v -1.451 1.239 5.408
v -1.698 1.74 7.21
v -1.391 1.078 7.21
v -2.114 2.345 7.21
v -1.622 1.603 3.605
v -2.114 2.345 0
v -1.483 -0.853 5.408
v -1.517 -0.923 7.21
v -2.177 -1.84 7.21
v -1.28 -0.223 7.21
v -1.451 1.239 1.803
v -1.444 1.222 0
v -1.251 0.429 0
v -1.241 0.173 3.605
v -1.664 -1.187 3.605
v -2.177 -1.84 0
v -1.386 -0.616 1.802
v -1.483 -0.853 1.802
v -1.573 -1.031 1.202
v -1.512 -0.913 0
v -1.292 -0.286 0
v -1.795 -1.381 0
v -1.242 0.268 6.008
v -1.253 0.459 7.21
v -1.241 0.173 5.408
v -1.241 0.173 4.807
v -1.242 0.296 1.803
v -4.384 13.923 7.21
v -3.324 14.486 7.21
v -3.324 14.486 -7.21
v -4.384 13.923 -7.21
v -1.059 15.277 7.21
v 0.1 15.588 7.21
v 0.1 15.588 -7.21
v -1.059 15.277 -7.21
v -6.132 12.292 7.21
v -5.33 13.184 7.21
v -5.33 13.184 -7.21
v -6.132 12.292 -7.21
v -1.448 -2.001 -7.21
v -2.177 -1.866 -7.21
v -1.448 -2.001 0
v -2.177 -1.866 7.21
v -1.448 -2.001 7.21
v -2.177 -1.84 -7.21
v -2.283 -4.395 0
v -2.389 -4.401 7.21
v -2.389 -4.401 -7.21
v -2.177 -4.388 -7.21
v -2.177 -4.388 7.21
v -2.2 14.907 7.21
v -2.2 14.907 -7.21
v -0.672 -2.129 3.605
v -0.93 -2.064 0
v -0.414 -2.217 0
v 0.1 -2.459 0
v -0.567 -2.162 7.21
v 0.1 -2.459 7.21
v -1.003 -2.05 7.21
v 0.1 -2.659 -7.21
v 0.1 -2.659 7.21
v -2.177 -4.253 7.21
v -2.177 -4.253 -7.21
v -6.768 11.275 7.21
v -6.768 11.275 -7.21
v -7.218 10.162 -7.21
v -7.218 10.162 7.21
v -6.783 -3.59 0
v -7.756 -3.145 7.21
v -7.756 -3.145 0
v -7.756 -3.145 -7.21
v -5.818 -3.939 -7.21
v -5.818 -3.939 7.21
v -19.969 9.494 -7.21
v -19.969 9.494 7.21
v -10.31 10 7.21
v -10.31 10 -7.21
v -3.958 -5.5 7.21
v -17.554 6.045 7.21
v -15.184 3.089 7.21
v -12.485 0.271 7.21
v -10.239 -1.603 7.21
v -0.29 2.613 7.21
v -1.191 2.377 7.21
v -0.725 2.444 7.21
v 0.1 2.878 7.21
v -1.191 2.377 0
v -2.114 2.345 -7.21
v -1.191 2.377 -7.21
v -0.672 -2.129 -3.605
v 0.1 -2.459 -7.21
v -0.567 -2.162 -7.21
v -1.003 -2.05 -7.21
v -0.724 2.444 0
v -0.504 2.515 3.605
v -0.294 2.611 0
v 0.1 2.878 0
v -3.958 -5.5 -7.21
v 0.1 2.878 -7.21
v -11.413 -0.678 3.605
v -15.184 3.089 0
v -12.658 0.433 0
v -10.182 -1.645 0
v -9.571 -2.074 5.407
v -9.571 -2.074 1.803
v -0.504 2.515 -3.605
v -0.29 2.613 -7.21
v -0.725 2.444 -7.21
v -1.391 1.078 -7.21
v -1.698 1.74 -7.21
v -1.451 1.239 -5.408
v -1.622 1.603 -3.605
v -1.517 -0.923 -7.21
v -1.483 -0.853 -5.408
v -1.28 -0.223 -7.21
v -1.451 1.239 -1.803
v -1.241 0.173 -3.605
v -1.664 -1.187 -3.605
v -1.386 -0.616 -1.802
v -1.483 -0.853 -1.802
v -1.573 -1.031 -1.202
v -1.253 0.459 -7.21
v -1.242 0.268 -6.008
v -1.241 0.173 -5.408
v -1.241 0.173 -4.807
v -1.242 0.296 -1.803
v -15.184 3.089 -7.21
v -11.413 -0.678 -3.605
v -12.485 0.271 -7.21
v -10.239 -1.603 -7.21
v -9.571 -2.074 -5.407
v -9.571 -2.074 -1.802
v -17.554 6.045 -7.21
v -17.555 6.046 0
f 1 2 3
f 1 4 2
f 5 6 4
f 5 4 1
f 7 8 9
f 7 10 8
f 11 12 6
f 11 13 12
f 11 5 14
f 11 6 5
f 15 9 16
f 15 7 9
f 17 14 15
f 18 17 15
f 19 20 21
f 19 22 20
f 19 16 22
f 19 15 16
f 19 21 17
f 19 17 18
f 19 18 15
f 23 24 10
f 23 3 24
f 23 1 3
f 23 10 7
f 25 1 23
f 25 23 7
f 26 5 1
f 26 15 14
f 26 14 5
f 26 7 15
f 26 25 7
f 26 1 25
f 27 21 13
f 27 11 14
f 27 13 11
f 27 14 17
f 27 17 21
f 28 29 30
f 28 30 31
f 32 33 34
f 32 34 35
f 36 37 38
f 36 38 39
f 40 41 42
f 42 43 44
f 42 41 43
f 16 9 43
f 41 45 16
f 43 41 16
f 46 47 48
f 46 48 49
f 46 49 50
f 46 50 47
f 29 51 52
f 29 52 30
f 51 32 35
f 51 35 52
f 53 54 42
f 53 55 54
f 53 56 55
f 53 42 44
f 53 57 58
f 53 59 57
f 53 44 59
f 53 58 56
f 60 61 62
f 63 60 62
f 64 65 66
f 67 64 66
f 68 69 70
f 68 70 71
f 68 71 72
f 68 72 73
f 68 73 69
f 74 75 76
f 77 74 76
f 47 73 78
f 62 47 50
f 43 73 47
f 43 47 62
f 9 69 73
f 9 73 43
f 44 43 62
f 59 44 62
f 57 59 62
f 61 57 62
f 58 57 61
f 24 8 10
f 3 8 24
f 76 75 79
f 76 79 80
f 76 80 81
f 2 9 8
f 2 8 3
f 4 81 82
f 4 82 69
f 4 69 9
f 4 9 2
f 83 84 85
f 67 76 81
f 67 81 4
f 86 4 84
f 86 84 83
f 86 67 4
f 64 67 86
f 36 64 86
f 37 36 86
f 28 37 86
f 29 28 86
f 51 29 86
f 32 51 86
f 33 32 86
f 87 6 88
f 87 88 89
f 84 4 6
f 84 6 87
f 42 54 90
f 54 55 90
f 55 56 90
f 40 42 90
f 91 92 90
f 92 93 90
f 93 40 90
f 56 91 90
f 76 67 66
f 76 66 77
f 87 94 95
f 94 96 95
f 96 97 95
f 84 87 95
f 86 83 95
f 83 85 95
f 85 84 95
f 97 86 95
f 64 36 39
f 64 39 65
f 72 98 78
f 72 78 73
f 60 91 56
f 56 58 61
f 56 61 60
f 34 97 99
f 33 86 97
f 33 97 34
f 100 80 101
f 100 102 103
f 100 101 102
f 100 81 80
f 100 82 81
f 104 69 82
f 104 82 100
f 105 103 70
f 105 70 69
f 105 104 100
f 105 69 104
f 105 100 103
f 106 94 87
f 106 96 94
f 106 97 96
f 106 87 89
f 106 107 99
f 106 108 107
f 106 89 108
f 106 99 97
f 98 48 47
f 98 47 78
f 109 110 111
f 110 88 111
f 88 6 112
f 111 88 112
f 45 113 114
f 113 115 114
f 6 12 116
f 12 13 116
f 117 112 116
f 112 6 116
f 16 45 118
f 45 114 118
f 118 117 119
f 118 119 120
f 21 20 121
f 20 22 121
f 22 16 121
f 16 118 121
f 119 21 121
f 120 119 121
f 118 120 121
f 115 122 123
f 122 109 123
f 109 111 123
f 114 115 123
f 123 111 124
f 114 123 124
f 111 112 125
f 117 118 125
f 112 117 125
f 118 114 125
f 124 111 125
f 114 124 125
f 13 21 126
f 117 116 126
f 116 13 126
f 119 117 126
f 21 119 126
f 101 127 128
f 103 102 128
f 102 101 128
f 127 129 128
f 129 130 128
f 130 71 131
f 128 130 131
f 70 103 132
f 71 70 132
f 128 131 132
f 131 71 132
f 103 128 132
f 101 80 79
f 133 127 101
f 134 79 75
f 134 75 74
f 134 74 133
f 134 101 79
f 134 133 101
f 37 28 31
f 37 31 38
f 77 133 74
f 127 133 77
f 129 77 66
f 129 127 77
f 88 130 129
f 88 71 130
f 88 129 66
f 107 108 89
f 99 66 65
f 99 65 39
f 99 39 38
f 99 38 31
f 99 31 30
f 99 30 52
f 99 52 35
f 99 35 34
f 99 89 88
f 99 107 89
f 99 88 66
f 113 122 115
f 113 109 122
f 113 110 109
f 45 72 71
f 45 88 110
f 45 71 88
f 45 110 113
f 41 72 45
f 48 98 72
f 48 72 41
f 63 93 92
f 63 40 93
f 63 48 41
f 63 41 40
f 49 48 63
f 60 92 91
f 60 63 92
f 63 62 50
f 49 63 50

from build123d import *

# Parameters (mm, degrees)
CROQUIS_BASE_DEPTH              = 7.21
LENTE_PPAL_1_REACH              = 29.232
LENTE_PPAL_1_DIRECTION_2_REACH  = 29.232
LENTE_PPAL_2_DEPTH              = 28.232395361
LENTE_PPAL_2_DEPTH_BACK         = 28.232395361
CROQUIS9_3_OUTSIDE_W            = 30.105
CROQUIS9_3_OUTSIDE_H            = 25.977
LENTE_FRONTAL_REACH             = 25.468
LENTE_FRONTAL_DIRECTION_2_REACH = 25.468
LENTE_TRASERA_REACH             = 28.339
LENTE_TRASERA_DIRECTION_2_REACH = 28.339


with BuildPart() as part:
    # Croquis1 → croquis base (new, symmetric)
    with BuildSketch(Plane.XY):
        with BuildLine():
            Line((-8.981845695, 12.608155172), (-23.035921146, 11.871612288))
            Line((-23.035921146, 11.871612288), (-23.035921146, 11.54013782))
            ThreePointArc((-23.035921146, 11.54013782), (-20.949684518, 9.582335705), (-18.945192114, 7.540918896))
            add(Edge.make_bspline(
                [(-18.945192114, 7.540918896), (-10.215008384, -3.697644103), (-2.846604825, -5.059081104)],
                knots=[0.497667241, 0.497667241, 0.497667241, 0.49955428, 0.49955428, 0.49955428], degree=2, weights=[1, 1, 1]))
            add(Edge.make_bspline(
                [(-2.846604825, -5.059081104), (-2.498165198, -4.87297933), (-2.177330418, -4.684462446)],
                knots=[0.498812075, 0.498812075, 0.498812075, 0.498911556, 0.498911556, 0.498911556], degree=2, weights=[1, 1, 1]))
            Line((-2.177330418, -4.684462446), (-2.177330418, 6.186438919))
            add(Edge.make_bspline(
                [(-2.177330418, 6.186438919), (-4.063319702, 8.141636997), (-6.994875026, 10.477389992)],
                knots=[0.50138293, 0.50138293, 0.50138293, 0.502013312, 0.502013312, 0.502013312], degree=2, weights=[1, 1, 1]))
            Line((-6.994875026, 10.477389992), (-8.981845695, 12.608155172))
        make_face()
    extrude(amount=CROQUIS_BASE_DEPTH, both=True)

    # lente ppal 1: up to this face of the body (flat: up to its plane)
    lente_ppal_1_end = Plane(part.part.faces().sort_by_distance((-10.153546236, 5.159655325, 7.21))[0])
    # Croquis9 → lente ppal 1 (add, up to the picked face)
    with BuildSketch(Plane.XY, mode=Mode.PRIVATE) as lente_ppal_1_sk1:
        with BuildLine():
            add(Edge.make_bspline(
                [(-2.177330418, -4.388282022), (-10.4130765, -4.994158739), (-19.969359014, 9.493765032)],
                knots=[0, 0, 0, 1, 1, 1], degree=2))
            Line((-19.969359014, 9.493765032), (-10.309820395, 10))
            Line((-10.309820395, 10), (-2.177330418, 6.082860828))
            Line((-2.177330418, 6.082860828), (-2.177330418, 2.424232079))
            add(Edge.make_bspline(
                [(-2.177330418, 2.424232079), (-0.304369247, 0.128042884), (-2.177330418, -1.840420572)],
                knots=[0, 0, 0, 1, 1, 1], degree=2))
            Line((-2.177330418, -1.840420572), (-2.177330418, -4.388282022))
        make_face()
    lente_ppal_1_tool1 = split(extrude(lente_ppal_1_sk1.sketch, amount=LENTE_PPAL_1_REACH, mode=Mode.PRIVATE), bisect_by=lente_ppal_1_end, keep=Keep.BOTH, mode=Mode.PRIVATE)
    add(lente_ppal_1_tool1.solids().sort_by(Axis((-9.106368, 3.599172, 0), (0, 0, 1)))[0])

    # lente ppal 1 direction 2: up to this face of the body (flat: up to its plane)
    lente_ppal_1_direction_2_end = Plane(part.part.faces().sort_by_distance((-10.153546236, 5.159655325, -7.21))[0])
    # Croquis9 → lente ppal 1 direction 2 (add, up to the picked face)
    with BuildSketch(Plane.XY, mode=Mode.PRIVATE) as lente_ppal_1_direction_2_sk1:
        with BuildLine():
            add(Edge.make_bspline(
                [(-2.177330418, -4.388282022), (-10.4130765, -4.994158739), (-19.969359014, 9.493765032)],
                knots=[0, 0, 0, 1, 1, 1], degree=2))
            Line((-19.969359014, 9.493765032), (-10.309820395, 10))
            Line((-10.309820395, 10), (-2.177330418, 6.082860828))
            Line((-2.177330418, 6.082860828), (-2.177330418, 2.424232079))
            add(Edge.make_bspline(
                [(-2.177330418, 2.424232079), (-0.304369247, 0.128042884), (-2.177330418, -1.840420572)],
                knots=[0, 0, 0, 1, 1, 1], degree=2))
            Line((-2.177330418, -1.840420572), (-2.177330418, -4.388282022))
        make_face()
    lente_ppal_1_direction_2_tool1 = split(extrude(lente_ppal_1_direction_2_sk1.sketch, amount=-LENTE_PPAL_1_DIRECTION_2_REACH, mode=Mode.PRIVATE), bisect_by=lente_ppal_1_direction_2_end, keep=Keep.BOTH, mode=Mode.PRIVATE)
    add(lente_ppal_1_direction_2_tool1.solids().sort_by(Axis((-9.106368, 3.599172, 0), (0, 0, -1)))[0])

    # Croquis9<3> outside → lente ppal 2 (cut, two sides: drawn at the far end of the back side and taken through both)
    with BuildSketch(Plane.XY.offset(-LENTE_PPAL_2_DEPTH_BACK)):
        with Locations((-12.1385, 3.7745)):
            Rectangle(CROQUIS9_3_OUTSIDE_W, CROQUIS9_3_OUTSIDE_H)
        with BuildLine():
            Line((-2.177330418, -1.840420572), (-2.177330418, -4.388282022))
            add(Edge.make_bspline(
                [(-2.177330418, -4.388282022), (-10.4130765, -4.994158739), (-19.969359014, 9.493765032)],
                knots=[0, 0, 0, 1, 1, 1], degree=2))
            Line((-19.969359014, 9.493765032), (-10.309820395, 10))
            Line((-10.309820395, 10), (-2.177330418, 6.082860828))
            Line((-2.177330418, 6.082860828), (-2.177330418, 2.424232079))
            add(Edge.make_bspline(
                [(-2.177330418, 2.424232079), (-0.304369247, 0.128042884), (-2.177330418, -1.840420572)],
                knots=[0, 0, 0, 1, 1, 1], degree=2))
        make_face(mode=Mode.SUBTRACT)
    extrude(amount=LENTE_PPAL_2_DEPTH + LENTE_PPAL_2_DEPTH_BACK, mode=Mode.SUBTRACT)

    # lente frontal: up to this face of the body (flat: up to its plane)
    lente_frontal_end = Plane(part.part.faces().sort_by_distance((-9.106367081, 3.599171888, 7.21))[0])
    # Croquis8 → lente frontal (add, up to the picked face)
    with BuildSketch(Plane.XY, mode=Mode.PRIVATE) as lente_frontal_sk1:
        with BuildLine():
            Line((0.1, 2.877673418), (0.1, 15.587903347))
            Line((0.1, 15.587903347), (-1.059110992, 15.277320493))
            Line((-1.059110992, 15.277320493), (-2.200378811, 14.9065001))
            Line((-2.200378811, 14.9065001), (-3.324385438, 14.486251242))
            Line((-3.324385438, 14.486251242), (-4.38392255, 13.922885367))
            Line((-4.38392255, 13.922885367), (-5.329535454, 13.184091597))
            Line((-5.329535454, 13.184091597), (-6.132492182, 12.292317806))
            Line((-6.132492182, 12.292317806), (-6.768395299, 11.274660091))
            Line((-6.768395299, 11.274660091), (-7.217923211, 10.162039465))
            Line((-7.217923211, 10.162039465), (-10.309820395, 10))
            Line((-10.309820395, 10), (-2.177330418, 2.342487007))
            Line((-2.177330418, 2.342487007), (-1.190501641, 2.376947827))
            add(Edge.make_bspline(
                [(-1.190501641, 2.376947827), (-0.463368169, 2.402339888), (0.1, 2.877673418)],
                knots=[0, 0, 0, 1, 1, 1], degree=2))
        make_face()
    lente_frontal_tool1 = split(extrude(lente_frontal_sk1.sketch, amount=LENTE_FRONTAL_REACH, mode=Mode.PRIVATE), bisect_by=lente_frontal_end, keep=Keep.BOTH, mode=Mode.PRIVATE)
    add(lente_frontal_tool1.solids().sort_by(Axis((-3.290182, 8.96302, 0), (0, 0, 1)))[0])

    # lente frontal direction 2: up to this face of the body (flat: up to its plane)
    lente_frontal_direction_2_end = Plane(part.part.faces().sort_by_distance((-9.106367081, 3.599171888, -7.21))[0])
    # Croquis8 → lente frontal direction 2 (add, up to the picked face)
    with BuildSketch(Plane.XY, mode=Mode.PRIVATE) as lente_frontal_direction_2_sk1:
        with BuildLine():
            Line((0.1, 2.877673418), (0.1, 15.587903347))
            Line((0.1, 15.587903347), (-1.059110992, 15.277320493))
            Line((-1.059110992, 15.277320493), (-2.200378811, 14.9065001))
            Line((-2.200378811, 14.9065001), (-3.324385438, 14.486251242))
            Line((-3.324385438, 14.486251242), (-4.38392255, 13.922885367))
            Line((-4.38392255, 13.922885367), (-5.329535454, 13.184091597))
            Line((-5.329535454, 13.184091597), (-6.132492182, 12.292317806))
            Line((-6.132492182, 12.292317806), (-6.768395299, 11.274660091))
            Line((-6.768395299, 11.274660091), (-7.217923211, 10.162039465))
            Line((-7.217923211, 10.162039465), (-10.309820395, 10))
            Line((-10.309820395, 10), (-2.177330418, 2.342487007))
            Line((-2.177330418, 2.342487007), (-1.190501641, 2.376947827))
            add(Edge.make_bspline(
                [(-1.190501641, 2.376947827), (-0.463368169, 2.402339888), (0.1, 2.877673418)],
                knots=[0, 0, 0, 1, 1, 1], degree=2))
        make_face()
    lente_frontal_direction_2_tool1 = split(extrude(lente_frontal_direction_2_sk1.sketch, amount=-LENTE_FRONTAL_DIRECTION_2_REACH, mode=Mode.PRIVATE), bisect_by=lente_frontal_direction_2_end, keep=Keep.BOTH, mode=Mode.PRIVATE)
    add(lente_frontal_direction_2_tool1.solids().sort_by(Axis((-3.290182, 8.96302, 0), (0, 0, -1)))[0])

    # lente trasera: up to this face of the body (flat: up to its plane)
    lente_trasera_end = Plane(part.part.faces().sort_by_distance((-7.357064552, 5.305385386, 7.21))[0])
    # Croquis11 → lente trasera (add, up to the picked face)
    with BuildSketch(Plane.XY, mode=Mode.PRIVATE) as lente_trasera_sk1:
        with BuildLine():
            Line((0.1, -2.458811066), (0.1, -2.658811066))
            Line((0.1, -2.658811066), (-3.957638313, -5.5))
            Line((-3.957638313, -5.5), (-10.029650265, -0.404977011))
            Line((-10.029650265, -0.404977011), (-1.447650757, -2.001370848))
            add(Edge.make_bspline(
                [(-1.447650757, -2.001370848), (-0.67030688, -2.028516294), (0.1, -2.458811066)],
                knots=[0, 0, 0, 1, 1, 1], degree=2))
        make_face()
    lente_trasera_tool1 = split(extrude(lente_trasera_sk1.sketch, amount=LENTE_TRASERA_REACH, mode=Mode.PRIVATE), bisect_by=lente_trasera_end, keep=Keep.BOTH, mode=Mode.PRIVATE)
    add(lente_trasera_tool1.solids().sort_by(Axis((-4.514125, -2.758798, 0), (0, 0, 1)))[0])

    # lente trasera direction 2: up to this face of the body (flat: up to its plane)
    lente_trasera_direction_2_end = Plane(part.part.faces().sort_by_distance((-7.357064552, 5.305385386, -7.21))[0])
    # Croquis11 → lente trasera direction 2 (add, up to the picked face)
    with BuildSketch(Plane.XY, mode=Mode.PRIVATE) as lente_trasera_direction_2_sk1:
        with BuildLine():
            Line((0.1, -2.458811066), (0.1, -2.658811066))
            Line((0.1, -2.658811066), (-3.957638313, -5.5))
            Line((-3.957638313, -5.5), (-10.029650265, -0.404977011))
            Line((-10.029650265, -0.404977011), (-1.447650757, -2.001370848))
            add(Edge.make_bspline(
                [(-1.447650757, -2.001370848), (-0.67030688, -2.028516294), (0.1, -2.458811066)],
                knots=[0, 0, 0, 1, 1, 1], degree=2))
        make_face()
    lente_trasera_direction_2_tool1 = split(extrude(lente_trasera_direction_2_sk1.sketch, amount=-LENTE_TRASERA_DIRECTION_2_REACH, mode=Mode.PRIVATE), bisect_by=lente_trasera_direction_2_end, keep=Keep.BOTH, mode=Mode.PRIVATE)
    add(lente_trasera_direction_2_tool1.solids().sort_by(Axis((-4.514125, -2.758798, 0), (0, 0, -1)))[0])


solid = part.part
